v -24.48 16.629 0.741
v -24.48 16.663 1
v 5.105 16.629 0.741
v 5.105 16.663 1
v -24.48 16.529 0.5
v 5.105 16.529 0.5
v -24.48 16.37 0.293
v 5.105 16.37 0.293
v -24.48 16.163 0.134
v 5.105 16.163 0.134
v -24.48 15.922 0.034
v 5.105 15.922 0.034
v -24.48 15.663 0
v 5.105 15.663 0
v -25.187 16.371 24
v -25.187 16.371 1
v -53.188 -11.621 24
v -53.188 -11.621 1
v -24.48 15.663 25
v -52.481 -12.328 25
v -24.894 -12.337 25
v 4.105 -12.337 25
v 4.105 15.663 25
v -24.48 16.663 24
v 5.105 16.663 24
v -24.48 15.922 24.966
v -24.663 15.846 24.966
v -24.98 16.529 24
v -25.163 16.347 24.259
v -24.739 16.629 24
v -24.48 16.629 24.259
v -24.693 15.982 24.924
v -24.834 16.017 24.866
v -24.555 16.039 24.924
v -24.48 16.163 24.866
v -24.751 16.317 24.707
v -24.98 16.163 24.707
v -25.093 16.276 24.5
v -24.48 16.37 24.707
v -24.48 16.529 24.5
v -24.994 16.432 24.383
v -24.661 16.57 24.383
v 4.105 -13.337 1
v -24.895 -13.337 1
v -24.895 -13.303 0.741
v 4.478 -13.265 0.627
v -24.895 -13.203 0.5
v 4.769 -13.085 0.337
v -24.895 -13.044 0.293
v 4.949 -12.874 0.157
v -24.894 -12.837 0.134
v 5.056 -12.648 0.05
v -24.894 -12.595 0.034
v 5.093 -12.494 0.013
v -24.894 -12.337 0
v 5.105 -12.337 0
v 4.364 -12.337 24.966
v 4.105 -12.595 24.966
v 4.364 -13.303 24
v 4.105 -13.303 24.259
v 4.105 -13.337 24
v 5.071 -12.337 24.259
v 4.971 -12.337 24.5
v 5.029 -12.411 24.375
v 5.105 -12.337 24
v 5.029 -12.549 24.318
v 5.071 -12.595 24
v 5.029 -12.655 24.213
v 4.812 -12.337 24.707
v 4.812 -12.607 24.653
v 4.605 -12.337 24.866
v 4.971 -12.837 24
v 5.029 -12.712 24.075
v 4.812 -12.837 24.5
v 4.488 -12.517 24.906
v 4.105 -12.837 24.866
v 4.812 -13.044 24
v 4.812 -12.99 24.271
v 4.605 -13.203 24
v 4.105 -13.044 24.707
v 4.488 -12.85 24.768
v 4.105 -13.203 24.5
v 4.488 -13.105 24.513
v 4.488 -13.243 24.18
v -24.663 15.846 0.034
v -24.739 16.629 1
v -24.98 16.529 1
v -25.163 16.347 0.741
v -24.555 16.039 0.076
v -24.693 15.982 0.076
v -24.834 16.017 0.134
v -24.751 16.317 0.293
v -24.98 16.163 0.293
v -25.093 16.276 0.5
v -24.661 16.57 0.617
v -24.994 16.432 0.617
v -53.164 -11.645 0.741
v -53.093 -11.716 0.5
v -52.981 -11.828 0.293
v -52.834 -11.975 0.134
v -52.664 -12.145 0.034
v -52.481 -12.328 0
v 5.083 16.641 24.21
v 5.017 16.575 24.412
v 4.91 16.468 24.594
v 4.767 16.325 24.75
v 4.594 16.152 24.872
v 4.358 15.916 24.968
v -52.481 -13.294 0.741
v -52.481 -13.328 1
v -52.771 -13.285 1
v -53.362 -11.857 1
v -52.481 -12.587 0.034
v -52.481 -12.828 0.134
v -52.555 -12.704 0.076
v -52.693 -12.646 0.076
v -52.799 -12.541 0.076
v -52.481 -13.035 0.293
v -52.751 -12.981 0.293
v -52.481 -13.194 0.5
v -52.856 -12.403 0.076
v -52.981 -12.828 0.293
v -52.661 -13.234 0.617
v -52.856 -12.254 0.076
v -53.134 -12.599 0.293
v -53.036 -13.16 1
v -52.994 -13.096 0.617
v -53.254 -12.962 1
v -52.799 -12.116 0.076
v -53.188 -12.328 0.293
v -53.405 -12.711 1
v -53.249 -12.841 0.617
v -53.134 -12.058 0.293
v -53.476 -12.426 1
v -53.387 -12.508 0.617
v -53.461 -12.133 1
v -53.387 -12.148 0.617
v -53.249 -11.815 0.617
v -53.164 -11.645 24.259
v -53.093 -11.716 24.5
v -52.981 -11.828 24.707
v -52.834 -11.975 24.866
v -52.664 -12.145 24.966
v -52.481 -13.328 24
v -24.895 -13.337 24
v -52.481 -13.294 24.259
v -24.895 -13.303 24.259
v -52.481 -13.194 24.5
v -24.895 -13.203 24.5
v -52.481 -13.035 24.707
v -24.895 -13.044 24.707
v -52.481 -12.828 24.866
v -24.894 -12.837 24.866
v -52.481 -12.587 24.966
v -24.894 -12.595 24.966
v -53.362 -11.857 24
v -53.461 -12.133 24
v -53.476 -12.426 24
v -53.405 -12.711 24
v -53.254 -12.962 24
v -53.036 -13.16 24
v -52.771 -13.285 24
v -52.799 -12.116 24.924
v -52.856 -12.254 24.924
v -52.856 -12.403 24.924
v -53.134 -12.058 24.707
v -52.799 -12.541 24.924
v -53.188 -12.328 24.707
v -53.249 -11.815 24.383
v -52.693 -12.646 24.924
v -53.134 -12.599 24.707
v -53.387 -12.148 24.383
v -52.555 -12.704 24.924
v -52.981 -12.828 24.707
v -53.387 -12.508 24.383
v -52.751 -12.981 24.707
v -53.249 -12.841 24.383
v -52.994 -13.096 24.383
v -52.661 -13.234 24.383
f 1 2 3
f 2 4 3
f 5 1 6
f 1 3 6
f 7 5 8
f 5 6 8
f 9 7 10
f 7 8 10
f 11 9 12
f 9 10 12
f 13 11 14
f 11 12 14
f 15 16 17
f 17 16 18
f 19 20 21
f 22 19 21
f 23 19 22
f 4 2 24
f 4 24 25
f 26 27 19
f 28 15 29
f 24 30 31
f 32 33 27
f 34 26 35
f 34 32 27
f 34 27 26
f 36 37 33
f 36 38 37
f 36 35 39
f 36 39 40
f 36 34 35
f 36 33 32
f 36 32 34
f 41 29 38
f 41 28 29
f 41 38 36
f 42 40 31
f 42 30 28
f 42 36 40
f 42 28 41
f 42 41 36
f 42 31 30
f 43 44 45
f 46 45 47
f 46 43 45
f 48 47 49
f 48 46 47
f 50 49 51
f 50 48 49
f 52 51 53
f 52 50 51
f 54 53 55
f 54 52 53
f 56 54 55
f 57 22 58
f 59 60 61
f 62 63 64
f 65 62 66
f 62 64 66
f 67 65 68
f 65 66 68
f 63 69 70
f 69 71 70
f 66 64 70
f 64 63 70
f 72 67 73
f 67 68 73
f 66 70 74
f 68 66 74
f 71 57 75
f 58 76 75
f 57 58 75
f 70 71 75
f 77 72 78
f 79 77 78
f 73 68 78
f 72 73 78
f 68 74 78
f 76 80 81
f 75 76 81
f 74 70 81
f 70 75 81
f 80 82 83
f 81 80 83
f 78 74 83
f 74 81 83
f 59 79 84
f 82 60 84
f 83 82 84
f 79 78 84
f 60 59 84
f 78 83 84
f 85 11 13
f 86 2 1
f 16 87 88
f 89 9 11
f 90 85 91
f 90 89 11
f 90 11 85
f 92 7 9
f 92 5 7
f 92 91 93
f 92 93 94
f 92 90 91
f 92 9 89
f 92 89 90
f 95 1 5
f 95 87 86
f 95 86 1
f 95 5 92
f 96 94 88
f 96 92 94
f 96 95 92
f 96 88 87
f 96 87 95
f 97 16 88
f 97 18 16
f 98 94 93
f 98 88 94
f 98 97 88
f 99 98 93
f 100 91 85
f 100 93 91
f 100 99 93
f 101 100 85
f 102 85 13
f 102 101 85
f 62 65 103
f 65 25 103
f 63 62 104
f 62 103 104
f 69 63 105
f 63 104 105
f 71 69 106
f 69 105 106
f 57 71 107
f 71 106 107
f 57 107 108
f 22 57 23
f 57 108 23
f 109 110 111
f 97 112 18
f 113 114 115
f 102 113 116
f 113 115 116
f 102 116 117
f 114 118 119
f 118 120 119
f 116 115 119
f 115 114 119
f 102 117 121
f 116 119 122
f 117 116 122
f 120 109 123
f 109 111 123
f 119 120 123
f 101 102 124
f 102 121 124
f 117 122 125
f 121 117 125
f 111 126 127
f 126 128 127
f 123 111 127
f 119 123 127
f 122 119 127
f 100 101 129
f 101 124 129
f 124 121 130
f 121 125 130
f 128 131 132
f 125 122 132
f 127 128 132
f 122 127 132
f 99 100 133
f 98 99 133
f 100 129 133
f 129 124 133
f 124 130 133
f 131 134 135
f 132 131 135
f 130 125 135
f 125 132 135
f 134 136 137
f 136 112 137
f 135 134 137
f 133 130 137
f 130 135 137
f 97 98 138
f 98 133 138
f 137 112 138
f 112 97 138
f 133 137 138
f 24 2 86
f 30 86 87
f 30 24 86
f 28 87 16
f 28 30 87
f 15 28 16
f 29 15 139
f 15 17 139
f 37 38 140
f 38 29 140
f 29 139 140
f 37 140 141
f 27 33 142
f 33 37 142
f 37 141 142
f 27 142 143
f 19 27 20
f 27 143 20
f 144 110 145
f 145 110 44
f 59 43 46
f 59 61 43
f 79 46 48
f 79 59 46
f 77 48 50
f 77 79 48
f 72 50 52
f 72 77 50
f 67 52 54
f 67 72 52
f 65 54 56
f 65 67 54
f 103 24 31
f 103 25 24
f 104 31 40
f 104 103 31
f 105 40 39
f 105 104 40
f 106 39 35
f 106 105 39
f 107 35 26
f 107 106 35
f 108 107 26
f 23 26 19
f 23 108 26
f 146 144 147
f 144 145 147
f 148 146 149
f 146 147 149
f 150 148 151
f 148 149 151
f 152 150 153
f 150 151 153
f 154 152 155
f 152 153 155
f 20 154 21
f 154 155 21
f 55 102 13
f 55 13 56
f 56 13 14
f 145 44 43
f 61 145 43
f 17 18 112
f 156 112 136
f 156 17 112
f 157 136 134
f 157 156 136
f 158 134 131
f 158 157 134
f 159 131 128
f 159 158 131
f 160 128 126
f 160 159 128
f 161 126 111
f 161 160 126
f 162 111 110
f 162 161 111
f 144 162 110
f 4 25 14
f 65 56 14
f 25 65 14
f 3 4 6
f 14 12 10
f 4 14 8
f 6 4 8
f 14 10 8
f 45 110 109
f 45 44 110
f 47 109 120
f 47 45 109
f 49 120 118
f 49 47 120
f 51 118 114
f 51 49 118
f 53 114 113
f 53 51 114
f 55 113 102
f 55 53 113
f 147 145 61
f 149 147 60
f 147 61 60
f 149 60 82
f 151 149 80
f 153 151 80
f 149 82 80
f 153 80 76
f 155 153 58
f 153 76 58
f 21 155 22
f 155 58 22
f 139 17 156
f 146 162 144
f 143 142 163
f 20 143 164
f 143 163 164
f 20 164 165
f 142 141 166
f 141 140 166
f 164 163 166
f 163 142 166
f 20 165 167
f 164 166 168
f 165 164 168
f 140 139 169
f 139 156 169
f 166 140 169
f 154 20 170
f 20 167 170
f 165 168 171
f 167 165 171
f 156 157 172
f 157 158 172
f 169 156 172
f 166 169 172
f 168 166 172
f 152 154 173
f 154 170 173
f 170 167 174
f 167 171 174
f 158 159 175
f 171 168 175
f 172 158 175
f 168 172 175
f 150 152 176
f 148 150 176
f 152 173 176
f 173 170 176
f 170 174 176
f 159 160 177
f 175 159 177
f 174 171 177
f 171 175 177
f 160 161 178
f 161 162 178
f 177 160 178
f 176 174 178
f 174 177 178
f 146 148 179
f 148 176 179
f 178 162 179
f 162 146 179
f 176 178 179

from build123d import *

# Parameters (mm, degrees)
F0_W     = 30
F0_H     = 30
F1_DEPTH = 25
F2_R     = 1


with BuildPart() as f1:
    # F0 (on Top) → F1 (new body)
    with BuildSketch(Plane.XY):
        with Locations((-9.894624, 1.663389)):
            Rectangle(F0_W, F0_H)
        Polygon((-24.894624, -13.336611), (-24.894624, 16.663389), (-54.894623, -13.327551), align=None)
    extrude(amount=F1_DEPTH)

    # F2
    f2_edges = [f1.edges().sort_by_distance(p)[0] for p in [
        (-39.894624, 1.667919, 25),
        (-39.894624, -13.332081, 25),
        (-9.894624, -13.336611, 25),
        (-9.894624, 16.663389, 25),
        (5.105376, 1.663389, 25),
        (-54.894623, -13.327551, 12.5),
        (-39.894624, -13.332081, 0),
        (-9.894624, -13.336611, 0),
        (5.105376, -13.336611, 12.5),
        (-24.894624, -13.336611, 12.5),
        (-39.894624, 1.667919, 0),
        (-24.894624, 16.663389, 12.5),
        (-9.894624, 16.663389, 0),
    ]]
    fillet(f2_edges, radius=F2_R)


solid = f1.part
